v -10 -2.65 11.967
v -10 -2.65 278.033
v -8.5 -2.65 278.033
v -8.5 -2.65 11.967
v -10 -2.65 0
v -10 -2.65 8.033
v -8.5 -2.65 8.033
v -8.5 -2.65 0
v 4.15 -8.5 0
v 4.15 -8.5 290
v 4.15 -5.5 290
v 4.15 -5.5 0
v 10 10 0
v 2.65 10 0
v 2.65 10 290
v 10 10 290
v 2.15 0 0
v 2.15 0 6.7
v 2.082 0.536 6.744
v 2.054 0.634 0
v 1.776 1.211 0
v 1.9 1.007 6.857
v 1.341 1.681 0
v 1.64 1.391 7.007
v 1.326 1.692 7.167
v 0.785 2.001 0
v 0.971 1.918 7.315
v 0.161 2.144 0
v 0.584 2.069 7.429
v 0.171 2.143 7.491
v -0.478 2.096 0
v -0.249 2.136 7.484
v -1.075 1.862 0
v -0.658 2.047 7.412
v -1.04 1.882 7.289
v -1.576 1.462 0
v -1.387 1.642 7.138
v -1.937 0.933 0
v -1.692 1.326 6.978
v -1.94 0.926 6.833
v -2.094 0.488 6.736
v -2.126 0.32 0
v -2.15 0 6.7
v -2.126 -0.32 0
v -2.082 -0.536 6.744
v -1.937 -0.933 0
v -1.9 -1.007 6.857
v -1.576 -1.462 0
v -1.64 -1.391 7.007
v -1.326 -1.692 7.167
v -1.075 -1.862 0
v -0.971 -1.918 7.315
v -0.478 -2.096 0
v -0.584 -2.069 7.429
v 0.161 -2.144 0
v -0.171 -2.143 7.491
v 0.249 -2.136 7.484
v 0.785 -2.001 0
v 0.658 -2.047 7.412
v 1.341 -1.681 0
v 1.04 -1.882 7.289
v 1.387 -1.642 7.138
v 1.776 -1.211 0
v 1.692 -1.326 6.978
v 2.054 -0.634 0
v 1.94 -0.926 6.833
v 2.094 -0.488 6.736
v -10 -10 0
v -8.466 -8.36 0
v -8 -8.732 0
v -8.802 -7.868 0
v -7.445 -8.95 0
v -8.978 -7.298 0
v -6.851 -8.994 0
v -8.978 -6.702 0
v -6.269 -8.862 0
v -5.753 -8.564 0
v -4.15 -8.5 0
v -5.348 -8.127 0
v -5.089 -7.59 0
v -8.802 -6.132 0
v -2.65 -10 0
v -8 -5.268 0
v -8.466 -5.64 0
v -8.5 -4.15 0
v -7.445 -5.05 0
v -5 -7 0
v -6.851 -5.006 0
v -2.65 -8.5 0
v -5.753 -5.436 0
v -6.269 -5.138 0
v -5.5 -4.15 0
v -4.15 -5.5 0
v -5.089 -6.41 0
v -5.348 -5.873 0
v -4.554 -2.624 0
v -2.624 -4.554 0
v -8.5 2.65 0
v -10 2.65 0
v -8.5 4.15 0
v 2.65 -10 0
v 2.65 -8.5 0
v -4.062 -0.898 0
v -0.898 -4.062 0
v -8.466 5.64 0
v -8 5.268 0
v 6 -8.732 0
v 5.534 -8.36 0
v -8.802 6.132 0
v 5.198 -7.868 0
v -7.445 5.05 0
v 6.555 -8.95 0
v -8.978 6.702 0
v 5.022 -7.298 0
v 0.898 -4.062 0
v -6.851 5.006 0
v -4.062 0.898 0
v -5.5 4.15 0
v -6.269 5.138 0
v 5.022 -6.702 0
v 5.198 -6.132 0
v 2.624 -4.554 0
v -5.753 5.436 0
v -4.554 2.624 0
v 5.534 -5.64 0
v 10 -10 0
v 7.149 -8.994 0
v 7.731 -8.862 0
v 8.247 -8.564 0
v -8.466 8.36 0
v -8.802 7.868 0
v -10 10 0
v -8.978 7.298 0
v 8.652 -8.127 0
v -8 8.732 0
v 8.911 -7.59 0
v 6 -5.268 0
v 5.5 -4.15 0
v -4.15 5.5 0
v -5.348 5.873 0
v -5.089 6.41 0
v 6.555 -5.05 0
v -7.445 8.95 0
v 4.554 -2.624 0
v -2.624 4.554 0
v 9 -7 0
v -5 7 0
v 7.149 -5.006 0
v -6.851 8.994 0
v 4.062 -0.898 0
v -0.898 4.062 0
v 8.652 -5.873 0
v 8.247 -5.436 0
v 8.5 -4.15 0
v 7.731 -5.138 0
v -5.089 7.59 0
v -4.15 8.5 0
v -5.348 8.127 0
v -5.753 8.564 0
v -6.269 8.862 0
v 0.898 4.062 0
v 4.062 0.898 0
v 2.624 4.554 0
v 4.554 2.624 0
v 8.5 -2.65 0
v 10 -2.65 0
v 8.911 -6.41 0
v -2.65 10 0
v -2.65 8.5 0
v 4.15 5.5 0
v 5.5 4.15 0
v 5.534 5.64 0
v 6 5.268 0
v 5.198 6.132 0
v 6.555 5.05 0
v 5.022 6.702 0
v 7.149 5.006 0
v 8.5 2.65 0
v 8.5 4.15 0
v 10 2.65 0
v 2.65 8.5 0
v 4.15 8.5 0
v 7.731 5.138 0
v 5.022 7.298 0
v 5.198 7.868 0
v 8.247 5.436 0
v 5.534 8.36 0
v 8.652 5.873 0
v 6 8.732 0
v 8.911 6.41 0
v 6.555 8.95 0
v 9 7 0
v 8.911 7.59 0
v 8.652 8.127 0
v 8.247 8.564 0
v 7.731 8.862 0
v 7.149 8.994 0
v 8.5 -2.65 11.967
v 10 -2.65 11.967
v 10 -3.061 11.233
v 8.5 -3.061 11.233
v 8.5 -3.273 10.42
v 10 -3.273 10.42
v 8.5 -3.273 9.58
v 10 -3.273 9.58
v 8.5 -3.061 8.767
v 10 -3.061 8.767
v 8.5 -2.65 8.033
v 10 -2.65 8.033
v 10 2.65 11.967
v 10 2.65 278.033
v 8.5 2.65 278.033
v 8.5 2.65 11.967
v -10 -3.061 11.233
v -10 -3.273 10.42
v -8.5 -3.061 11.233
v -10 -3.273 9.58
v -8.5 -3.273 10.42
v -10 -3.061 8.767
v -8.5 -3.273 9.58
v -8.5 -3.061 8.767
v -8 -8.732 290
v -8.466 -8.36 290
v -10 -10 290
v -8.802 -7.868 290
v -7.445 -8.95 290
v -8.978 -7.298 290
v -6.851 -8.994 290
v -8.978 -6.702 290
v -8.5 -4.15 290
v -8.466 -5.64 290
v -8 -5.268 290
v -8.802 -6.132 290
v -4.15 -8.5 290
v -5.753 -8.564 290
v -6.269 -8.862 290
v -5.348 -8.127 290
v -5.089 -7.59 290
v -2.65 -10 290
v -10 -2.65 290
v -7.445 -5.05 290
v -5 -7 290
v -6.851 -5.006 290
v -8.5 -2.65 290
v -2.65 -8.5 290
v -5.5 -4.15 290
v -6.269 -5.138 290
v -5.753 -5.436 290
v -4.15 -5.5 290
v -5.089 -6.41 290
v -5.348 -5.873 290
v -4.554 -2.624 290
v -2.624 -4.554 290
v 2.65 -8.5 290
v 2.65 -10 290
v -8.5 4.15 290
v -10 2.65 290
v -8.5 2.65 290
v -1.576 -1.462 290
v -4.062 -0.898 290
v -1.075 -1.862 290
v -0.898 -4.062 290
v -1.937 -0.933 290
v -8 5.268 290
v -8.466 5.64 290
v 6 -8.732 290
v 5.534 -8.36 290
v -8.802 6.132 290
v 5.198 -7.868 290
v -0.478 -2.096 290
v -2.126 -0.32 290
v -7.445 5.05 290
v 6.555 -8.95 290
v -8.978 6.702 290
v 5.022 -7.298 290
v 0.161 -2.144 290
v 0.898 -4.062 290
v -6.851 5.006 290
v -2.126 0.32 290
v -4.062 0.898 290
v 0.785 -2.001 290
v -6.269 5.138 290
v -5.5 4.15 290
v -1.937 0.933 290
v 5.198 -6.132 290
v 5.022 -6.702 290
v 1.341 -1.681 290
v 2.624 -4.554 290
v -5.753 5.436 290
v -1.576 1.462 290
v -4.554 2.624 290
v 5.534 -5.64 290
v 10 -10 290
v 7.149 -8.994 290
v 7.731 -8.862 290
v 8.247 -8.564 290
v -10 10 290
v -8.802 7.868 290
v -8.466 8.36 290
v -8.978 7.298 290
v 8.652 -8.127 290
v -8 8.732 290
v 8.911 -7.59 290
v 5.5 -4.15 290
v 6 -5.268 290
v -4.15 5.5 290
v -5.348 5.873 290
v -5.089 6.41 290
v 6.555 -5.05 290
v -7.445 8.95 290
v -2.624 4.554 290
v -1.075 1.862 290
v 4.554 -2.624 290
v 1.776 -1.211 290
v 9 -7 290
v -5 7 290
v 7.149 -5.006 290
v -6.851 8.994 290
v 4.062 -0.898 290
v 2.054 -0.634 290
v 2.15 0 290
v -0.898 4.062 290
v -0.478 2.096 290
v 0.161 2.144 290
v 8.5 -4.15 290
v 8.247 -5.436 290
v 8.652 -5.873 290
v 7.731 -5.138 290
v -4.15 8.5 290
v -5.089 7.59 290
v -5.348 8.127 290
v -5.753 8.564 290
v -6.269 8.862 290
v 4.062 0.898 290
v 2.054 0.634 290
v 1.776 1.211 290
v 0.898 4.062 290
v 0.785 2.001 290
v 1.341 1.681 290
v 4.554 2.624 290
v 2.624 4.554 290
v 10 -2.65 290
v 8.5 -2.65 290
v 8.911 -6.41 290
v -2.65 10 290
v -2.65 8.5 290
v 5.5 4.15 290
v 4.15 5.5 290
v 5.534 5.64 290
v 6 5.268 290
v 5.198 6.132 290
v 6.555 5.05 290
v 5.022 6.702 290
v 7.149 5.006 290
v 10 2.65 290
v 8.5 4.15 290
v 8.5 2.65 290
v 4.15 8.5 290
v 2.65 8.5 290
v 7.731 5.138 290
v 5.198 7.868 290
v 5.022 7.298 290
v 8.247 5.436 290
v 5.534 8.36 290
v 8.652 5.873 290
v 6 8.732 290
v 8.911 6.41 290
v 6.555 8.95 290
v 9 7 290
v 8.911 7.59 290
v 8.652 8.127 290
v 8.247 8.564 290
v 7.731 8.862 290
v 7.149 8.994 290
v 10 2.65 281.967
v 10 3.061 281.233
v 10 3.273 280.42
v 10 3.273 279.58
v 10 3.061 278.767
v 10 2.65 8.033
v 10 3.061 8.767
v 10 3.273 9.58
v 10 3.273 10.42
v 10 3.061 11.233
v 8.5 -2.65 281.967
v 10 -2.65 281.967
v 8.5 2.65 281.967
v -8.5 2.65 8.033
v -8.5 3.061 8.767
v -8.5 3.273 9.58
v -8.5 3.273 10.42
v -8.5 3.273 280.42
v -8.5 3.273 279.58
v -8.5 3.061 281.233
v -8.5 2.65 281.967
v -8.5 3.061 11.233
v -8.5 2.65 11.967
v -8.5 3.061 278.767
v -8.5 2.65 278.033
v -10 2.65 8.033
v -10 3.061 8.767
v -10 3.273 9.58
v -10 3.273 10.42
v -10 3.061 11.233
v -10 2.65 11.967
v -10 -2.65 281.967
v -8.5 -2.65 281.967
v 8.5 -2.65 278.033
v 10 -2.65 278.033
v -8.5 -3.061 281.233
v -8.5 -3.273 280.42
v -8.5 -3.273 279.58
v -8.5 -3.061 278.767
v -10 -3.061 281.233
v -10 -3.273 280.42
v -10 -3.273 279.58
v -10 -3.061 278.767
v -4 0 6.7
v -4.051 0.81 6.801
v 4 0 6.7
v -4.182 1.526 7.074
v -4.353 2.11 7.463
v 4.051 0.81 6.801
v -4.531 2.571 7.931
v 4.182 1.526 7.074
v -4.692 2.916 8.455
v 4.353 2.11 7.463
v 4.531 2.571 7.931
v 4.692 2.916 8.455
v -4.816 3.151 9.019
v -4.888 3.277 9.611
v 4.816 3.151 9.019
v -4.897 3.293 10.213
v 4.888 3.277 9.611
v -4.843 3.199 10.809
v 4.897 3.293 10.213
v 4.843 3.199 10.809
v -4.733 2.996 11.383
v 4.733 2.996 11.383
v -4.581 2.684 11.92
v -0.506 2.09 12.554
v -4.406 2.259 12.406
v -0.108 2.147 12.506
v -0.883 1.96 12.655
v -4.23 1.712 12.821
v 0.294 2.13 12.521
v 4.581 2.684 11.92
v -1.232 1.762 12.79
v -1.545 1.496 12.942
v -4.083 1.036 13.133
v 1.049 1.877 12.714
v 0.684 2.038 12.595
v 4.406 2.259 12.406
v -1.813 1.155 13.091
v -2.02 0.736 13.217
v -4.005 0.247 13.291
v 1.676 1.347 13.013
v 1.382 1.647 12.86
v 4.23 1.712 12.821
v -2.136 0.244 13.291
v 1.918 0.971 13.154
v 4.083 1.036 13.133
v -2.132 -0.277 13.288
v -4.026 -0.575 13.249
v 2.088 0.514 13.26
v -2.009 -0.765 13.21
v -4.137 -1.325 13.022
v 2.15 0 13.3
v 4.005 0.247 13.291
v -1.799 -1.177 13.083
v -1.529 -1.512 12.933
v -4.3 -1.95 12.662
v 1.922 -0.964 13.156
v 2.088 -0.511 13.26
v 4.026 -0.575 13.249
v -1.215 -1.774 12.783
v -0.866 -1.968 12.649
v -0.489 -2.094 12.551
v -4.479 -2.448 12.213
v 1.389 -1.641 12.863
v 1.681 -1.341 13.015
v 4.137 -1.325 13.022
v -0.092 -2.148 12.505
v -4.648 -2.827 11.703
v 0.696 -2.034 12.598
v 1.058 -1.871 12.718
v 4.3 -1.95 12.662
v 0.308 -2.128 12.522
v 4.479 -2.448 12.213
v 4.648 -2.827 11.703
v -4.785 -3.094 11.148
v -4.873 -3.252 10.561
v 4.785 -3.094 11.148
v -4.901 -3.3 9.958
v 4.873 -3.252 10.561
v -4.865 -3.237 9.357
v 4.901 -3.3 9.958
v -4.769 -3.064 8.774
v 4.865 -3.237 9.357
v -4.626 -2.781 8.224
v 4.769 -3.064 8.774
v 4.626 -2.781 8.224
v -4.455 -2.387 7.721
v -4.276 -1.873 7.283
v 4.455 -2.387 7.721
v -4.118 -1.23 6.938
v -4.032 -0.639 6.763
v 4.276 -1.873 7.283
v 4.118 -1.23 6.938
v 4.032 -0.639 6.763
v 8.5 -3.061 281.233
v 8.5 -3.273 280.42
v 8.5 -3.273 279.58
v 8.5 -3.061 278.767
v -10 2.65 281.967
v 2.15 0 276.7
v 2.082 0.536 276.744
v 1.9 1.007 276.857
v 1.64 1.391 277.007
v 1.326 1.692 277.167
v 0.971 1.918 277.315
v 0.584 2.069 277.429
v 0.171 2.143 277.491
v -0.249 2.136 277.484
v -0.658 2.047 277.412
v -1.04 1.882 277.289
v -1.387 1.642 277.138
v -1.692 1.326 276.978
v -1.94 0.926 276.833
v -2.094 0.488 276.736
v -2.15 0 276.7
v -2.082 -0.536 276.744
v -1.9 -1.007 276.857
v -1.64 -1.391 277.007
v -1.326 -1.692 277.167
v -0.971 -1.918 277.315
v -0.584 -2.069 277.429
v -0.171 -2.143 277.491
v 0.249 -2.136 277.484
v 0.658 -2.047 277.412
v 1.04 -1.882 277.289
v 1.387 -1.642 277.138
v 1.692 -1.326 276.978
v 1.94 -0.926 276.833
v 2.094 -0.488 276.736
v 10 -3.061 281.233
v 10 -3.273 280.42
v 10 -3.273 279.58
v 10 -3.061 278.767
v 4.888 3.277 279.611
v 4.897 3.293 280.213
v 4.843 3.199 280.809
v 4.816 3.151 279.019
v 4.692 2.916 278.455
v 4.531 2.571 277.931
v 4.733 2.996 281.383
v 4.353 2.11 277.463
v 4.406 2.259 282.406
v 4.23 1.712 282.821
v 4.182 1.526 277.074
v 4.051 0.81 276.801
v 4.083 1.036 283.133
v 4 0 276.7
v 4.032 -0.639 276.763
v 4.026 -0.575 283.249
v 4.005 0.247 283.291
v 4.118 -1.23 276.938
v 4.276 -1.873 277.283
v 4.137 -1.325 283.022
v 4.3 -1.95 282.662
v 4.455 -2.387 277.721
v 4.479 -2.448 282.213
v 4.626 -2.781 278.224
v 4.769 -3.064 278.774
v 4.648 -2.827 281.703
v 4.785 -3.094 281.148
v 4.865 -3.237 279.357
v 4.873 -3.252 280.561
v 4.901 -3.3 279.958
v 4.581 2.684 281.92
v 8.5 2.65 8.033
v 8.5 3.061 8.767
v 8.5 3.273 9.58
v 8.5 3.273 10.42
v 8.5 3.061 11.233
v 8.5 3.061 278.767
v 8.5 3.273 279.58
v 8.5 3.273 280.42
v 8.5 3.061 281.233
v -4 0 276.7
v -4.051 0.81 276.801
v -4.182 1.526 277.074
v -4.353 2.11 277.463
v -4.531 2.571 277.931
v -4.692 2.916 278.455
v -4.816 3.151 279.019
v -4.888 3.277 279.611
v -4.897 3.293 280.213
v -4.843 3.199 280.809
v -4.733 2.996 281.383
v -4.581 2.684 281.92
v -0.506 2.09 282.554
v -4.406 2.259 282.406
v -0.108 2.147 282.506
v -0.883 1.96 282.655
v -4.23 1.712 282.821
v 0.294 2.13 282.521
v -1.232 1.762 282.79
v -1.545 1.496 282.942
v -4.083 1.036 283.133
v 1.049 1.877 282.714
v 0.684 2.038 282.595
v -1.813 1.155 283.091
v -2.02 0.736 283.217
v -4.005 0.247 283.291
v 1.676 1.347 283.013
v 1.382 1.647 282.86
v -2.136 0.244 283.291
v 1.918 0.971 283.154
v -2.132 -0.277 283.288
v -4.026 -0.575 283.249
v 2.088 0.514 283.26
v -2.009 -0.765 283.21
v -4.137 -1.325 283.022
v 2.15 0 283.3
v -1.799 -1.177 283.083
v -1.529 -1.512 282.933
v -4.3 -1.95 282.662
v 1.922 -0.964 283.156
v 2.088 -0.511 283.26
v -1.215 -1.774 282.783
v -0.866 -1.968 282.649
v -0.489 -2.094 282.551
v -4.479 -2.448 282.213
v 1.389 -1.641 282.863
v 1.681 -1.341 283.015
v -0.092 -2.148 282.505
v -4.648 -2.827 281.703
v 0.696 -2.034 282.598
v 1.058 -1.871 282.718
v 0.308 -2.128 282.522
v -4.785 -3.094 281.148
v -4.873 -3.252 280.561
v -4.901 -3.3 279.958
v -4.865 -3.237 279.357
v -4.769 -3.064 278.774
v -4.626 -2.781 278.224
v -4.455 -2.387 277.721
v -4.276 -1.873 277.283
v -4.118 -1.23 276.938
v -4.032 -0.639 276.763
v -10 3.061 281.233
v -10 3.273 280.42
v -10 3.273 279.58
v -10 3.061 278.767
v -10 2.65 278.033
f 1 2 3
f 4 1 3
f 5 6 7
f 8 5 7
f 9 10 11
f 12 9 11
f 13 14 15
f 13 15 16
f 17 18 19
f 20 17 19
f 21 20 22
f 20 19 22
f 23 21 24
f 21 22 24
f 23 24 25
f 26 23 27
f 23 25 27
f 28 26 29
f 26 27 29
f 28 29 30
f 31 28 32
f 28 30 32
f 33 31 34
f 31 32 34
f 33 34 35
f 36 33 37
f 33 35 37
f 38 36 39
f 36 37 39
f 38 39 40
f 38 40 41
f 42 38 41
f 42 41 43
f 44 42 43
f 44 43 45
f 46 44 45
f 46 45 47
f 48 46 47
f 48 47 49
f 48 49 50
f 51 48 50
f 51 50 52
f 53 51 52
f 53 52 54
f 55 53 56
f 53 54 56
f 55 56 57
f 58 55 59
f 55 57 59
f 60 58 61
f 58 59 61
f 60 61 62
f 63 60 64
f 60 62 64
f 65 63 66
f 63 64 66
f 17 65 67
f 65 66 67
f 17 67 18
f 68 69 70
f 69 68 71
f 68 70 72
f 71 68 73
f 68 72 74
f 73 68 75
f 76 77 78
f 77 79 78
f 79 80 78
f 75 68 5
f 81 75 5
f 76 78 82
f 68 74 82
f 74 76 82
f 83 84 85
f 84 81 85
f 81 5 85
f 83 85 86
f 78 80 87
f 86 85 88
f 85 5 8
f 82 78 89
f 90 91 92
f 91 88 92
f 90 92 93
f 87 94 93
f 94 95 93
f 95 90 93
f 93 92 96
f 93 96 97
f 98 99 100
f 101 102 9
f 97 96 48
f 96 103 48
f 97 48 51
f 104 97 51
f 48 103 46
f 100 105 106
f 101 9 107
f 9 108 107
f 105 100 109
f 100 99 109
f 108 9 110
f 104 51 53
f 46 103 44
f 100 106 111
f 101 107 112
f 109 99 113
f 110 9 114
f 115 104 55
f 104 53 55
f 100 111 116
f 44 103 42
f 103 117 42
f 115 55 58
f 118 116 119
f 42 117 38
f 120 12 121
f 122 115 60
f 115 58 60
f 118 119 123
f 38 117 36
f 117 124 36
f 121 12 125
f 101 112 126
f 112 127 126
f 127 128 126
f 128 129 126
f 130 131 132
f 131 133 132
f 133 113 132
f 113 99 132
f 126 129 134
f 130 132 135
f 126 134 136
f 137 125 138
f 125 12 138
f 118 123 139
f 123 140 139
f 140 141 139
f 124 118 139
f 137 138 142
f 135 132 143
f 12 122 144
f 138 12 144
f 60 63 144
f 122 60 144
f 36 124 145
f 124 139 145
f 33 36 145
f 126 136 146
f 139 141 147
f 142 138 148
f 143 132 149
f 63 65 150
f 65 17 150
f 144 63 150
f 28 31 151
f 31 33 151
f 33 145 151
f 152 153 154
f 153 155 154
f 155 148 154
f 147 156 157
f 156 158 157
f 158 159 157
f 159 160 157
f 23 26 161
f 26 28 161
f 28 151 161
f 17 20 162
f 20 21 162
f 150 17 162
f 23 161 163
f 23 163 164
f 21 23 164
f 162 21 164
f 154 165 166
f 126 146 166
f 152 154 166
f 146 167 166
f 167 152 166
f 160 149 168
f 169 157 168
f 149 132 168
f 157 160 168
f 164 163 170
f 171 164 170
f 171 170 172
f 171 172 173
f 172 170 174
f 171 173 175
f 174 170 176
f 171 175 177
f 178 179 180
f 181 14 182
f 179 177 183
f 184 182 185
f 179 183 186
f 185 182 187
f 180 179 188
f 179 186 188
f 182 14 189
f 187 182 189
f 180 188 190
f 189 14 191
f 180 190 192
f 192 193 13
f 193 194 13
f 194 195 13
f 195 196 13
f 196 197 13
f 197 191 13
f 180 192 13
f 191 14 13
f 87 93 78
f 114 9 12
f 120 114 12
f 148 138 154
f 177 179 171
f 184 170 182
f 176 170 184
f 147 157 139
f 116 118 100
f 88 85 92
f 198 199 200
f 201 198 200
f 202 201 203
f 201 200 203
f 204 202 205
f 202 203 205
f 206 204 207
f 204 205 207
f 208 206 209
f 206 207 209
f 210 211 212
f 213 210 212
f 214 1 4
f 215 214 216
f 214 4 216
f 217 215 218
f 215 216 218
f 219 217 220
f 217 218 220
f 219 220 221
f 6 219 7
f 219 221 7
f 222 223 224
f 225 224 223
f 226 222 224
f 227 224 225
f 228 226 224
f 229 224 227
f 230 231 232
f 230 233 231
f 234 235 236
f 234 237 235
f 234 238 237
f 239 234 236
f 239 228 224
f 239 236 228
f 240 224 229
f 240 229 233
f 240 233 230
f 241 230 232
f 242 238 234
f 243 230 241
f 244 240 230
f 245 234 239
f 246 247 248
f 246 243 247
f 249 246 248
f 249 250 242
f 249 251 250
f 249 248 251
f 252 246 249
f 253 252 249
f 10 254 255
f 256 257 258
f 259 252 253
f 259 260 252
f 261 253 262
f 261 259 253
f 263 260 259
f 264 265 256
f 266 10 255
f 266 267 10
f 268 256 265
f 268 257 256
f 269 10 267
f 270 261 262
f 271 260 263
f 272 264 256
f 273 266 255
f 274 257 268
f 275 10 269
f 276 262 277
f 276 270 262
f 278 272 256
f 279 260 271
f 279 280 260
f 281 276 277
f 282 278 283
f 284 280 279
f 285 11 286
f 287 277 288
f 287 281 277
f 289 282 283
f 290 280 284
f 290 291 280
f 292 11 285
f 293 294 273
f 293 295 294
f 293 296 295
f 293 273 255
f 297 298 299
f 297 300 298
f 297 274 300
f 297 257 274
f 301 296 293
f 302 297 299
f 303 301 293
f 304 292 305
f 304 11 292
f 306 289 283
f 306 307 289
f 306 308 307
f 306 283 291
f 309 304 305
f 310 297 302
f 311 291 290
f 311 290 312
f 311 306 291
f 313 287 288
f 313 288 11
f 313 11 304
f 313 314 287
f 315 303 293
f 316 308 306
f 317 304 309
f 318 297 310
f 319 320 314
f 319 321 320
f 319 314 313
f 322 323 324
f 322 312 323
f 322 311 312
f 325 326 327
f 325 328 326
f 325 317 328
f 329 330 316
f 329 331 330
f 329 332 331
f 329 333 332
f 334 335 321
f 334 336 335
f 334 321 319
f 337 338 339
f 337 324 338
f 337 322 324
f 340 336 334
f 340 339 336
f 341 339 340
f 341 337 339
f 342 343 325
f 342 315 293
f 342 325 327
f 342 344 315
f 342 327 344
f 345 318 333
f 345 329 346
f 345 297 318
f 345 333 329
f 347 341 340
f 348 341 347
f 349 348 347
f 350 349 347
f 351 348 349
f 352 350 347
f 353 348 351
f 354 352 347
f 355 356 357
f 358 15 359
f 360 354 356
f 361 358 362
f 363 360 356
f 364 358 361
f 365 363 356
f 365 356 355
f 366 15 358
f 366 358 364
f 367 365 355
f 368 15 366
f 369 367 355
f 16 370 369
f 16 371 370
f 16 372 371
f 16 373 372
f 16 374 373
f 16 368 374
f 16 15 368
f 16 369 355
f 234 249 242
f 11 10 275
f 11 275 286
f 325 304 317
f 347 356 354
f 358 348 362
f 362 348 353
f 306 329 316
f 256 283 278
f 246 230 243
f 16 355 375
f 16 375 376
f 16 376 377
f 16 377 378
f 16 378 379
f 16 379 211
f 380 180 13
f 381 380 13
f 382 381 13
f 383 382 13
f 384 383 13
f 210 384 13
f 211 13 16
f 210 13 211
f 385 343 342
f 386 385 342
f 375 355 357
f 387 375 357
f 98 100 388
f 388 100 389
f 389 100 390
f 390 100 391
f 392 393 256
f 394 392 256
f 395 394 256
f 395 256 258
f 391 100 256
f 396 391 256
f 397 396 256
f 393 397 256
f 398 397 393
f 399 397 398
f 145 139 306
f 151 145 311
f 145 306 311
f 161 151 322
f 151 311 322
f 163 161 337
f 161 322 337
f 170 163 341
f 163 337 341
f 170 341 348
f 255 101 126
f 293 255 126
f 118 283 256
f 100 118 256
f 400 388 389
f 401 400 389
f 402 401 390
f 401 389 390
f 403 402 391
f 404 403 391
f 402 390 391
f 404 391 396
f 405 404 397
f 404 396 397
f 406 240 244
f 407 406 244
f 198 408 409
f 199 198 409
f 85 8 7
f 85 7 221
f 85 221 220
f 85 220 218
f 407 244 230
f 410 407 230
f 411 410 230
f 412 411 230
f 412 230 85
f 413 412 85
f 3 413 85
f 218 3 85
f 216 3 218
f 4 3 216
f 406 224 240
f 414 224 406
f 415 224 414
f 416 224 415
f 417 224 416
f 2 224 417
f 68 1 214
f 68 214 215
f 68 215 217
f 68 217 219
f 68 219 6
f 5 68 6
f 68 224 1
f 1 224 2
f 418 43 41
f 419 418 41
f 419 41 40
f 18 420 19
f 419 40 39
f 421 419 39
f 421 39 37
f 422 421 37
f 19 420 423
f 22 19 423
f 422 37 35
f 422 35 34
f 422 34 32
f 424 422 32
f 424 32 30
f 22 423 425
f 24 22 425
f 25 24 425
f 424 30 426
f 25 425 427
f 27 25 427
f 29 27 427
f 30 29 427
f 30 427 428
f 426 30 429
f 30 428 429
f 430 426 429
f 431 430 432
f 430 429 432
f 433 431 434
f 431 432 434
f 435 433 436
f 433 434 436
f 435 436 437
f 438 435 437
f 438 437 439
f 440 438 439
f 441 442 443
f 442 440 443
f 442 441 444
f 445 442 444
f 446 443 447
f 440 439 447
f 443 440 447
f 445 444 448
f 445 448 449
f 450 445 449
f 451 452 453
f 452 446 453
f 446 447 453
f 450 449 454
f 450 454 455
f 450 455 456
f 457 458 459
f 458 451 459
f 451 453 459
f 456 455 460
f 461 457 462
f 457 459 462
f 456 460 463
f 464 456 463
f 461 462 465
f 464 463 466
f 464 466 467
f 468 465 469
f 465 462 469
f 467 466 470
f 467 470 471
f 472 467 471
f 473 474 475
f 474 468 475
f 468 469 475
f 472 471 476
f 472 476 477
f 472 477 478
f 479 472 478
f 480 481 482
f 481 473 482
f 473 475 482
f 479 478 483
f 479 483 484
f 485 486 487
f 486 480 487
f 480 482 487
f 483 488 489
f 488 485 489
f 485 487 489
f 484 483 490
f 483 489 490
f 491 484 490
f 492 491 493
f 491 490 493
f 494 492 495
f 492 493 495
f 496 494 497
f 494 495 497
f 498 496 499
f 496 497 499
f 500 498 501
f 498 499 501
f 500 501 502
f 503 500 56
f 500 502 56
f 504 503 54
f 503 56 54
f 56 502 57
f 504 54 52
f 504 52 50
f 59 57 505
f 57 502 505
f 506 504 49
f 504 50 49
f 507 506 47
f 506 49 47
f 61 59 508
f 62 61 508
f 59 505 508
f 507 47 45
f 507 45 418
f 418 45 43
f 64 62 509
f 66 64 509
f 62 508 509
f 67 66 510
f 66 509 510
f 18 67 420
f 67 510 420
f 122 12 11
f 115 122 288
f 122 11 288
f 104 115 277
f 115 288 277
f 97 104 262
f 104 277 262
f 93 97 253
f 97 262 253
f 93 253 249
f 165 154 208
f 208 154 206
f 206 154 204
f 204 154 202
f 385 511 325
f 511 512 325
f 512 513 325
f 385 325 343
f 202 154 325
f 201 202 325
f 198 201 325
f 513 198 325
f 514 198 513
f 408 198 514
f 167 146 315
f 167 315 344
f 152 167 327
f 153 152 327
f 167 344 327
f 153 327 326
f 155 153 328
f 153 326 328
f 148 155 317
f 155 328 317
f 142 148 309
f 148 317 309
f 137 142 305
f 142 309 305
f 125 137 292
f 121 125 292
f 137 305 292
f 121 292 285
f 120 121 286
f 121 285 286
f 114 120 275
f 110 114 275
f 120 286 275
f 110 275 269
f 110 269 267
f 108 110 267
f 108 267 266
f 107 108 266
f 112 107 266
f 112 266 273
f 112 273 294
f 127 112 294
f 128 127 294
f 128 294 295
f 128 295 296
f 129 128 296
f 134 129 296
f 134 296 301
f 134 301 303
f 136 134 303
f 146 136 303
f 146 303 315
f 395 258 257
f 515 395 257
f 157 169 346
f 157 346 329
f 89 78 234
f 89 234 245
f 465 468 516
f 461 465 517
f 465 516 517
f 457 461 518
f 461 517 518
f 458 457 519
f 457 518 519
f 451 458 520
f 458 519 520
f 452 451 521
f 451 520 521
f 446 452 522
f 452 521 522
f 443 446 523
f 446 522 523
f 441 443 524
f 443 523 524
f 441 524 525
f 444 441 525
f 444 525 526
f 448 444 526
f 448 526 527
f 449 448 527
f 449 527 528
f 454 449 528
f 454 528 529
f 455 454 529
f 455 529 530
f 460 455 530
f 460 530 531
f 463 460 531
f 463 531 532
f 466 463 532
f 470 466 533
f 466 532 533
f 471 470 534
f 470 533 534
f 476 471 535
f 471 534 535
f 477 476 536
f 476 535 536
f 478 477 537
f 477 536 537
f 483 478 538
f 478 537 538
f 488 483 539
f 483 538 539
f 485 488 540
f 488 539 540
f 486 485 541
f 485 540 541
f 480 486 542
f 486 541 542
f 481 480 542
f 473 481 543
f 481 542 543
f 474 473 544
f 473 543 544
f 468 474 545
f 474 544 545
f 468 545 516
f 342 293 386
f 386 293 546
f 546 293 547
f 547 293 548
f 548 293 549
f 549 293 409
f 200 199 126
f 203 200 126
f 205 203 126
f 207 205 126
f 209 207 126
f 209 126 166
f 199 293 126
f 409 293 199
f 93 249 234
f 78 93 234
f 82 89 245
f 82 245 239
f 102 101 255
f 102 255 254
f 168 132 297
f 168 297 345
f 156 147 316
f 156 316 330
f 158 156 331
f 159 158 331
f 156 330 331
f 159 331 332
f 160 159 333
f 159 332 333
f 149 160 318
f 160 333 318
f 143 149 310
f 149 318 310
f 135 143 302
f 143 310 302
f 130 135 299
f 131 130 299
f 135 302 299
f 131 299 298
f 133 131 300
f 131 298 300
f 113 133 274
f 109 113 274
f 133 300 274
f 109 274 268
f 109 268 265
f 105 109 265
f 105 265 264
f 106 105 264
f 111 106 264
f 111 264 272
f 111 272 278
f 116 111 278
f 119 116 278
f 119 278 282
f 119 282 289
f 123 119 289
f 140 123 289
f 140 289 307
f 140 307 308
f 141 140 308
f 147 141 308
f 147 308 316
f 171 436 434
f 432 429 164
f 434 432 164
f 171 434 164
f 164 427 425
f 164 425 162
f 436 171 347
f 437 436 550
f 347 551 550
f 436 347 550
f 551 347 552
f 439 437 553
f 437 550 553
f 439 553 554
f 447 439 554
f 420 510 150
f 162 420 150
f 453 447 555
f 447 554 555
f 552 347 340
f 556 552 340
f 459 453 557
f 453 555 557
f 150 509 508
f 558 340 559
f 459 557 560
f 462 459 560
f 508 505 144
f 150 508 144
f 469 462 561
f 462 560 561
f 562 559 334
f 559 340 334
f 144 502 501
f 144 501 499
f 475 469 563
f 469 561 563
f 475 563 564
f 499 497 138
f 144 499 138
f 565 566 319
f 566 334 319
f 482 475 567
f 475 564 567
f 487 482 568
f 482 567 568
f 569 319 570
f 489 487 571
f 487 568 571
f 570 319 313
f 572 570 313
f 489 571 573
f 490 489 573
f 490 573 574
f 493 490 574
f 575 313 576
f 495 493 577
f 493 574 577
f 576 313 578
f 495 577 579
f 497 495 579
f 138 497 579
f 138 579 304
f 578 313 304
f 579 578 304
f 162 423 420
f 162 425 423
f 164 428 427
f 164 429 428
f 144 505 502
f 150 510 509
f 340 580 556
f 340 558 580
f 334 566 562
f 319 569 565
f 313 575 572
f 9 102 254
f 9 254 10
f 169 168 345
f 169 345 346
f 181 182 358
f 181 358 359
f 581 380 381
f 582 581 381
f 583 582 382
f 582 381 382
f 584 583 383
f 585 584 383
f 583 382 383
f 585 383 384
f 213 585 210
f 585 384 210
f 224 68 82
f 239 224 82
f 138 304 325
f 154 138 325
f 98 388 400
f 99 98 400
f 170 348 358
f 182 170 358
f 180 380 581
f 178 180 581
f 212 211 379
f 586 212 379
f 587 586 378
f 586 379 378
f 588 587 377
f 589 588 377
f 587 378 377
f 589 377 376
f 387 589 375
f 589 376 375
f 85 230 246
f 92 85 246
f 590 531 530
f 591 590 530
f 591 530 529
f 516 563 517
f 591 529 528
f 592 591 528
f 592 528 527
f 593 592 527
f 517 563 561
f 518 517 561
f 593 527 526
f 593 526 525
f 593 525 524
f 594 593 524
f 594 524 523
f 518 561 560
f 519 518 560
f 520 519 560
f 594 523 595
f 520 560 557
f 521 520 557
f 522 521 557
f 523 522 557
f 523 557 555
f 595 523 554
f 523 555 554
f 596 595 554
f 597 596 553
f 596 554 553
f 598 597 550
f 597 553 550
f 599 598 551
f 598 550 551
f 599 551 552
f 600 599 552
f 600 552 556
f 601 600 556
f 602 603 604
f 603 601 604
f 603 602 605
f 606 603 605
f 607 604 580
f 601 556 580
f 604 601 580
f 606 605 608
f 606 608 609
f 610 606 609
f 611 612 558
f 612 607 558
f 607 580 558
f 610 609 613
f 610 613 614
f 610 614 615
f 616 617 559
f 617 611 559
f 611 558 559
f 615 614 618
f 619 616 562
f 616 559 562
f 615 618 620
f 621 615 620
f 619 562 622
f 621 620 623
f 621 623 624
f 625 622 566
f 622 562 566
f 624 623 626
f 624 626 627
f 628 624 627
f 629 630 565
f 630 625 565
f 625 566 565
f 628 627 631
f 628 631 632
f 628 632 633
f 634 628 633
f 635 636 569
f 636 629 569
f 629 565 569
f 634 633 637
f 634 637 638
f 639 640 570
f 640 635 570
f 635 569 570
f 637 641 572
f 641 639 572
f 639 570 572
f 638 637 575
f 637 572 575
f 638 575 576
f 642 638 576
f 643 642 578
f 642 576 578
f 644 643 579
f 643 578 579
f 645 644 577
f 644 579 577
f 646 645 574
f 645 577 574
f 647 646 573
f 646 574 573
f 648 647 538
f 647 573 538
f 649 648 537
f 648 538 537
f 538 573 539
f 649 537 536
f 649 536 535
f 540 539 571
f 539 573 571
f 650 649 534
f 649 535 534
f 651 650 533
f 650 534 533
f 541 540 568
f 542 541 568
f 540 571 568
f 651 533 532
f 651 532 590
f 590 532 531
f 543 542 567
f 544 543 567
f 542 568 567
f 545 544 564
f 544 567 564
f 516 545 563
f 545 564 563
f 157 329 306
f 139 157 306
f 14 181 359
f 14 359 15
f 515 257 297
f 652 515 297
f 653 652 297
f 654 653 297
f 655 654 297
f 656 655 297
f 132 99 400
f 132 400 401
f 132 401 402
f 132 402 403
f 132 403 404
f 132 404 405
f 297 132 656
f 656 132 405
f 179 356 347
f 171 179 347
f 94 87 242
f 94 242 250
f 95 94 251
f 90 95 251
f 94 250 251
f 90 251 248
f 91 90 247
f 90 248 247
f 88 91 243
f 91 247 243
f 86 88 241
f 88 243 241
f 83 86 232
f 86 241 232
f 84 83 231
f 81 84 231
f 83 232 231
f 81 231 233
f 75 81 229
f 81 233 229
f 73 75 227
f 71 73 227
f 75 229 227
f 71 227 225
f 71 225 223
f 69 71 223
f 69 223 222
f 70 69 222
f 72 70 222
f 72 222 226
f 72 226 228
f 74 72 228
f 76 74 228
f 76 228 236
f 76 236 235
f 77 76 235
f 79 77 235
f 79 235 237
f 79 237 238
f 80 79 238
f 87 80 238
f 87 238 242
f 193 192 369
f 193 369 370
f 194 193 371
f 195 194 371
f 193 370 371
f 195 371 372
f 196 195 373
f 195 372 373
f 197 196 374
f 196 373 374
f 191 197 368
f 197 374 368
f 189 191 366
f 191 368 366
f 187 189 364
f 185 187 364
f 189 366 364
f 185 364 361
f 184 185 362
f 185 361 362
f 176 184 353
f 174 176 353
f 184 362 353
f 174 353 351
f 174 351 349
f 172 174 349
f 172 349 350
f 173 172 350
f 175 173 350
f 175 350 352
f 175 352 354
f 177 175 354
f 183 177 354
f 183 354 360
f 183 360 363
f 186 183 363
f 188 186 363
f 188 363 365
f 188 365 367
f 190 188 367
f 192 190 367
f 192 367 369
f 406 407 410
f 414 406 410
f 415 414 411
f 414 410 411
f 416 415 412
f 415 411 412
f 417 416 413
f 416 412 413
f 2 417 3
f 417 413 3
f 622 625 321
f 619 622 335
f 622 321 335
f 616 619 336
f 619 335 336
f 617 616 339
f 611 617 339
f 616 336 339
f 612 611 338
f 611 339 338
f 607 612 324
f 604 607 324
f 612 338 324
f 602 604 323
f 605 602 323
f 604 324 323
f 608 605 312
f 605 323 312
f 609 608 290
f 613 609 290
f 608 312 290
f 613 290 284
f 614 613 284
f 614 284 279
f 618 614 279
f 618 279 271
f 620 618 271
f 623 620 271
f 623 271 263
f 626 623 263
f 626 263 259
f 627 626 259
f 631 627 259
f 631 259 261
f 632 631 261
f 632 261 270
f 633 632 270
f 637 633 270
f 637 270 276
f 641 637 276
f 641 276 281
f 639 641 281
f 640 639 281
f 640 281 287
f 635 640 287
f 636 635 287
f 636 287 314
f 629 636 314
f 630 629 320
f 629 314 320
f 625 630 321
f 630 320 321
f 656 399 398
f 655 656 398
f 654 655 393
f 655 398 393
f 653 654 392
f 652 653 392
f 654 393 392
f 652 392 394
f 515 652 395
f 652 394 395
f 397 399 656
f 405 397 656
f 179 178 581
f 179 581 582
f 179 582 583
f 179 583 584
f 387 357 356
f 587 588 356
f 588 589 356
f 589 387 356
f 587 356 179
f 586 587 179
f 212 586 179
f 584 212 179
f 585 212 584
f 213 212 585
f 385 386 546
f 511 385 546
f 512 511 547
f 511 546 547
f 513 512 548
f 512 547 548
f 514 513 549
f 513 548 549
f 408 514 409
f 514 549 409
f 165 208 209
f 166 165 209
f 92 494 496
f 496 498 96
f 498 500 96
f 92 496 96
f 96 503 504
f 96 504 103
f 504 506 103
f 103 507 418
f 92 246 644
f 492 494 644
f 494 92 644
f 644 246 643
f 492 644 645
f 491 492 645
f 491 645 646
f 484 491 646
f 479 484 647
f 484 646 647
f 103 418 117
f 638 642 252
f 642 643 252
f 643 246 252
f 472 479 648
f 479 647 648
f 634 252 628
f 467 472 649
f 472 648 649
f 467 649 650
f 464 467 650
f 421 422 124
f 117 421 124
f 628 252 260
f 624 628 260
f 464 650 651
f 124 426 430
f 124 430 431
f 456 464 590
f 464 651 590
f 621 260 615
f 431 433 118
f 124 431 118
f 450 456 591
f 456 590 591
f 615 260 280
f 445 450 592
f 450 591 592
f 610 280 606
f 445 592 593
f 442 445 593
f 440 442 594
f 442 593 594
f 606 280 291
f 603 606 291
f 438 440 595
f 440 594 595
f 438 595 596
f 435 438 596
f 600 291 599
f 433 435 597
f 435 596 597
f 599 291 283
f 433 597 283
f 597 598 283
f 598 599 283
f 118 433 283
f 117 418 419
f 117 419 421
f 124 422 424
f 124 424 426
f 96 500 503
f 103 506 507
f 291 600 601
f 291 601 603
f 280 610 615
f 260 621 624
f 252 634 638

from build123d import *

# Parameters (mm, degrees)
SKETCH_1_W          = 20
SKETCH_1_H          = 20
EXTRUDE_1_DEPTH     = 290
SKETCH_2_R          = 2.15
SKETCH_2_R_2        = 2
CUT_EXTRUDE_1_DEPTH = 291.344622819
HOLE_WIZARD_M6_1_D  = 6.6


with BuildPart() as part:
    # 스케치1 → 보스-돌출1 (new body)
    with BuildSketch(Plane.XY):
        Rectangle(SKETCH_1_W, SKETCH_1_H)
    extrude(amount=EXTRUDE_1_DEPTH)

    # 스케치2 → 컷-돌출1 (cut, through all)
    with BuildSketch(Plane.XY.offset(290)):
        Circle(SKETCH_2_R)
        with Locations((-7, 7)):
            Circle(SKETCH_2_R_2)
        with Locations((7, 7)):
            Circle(SKETCH_2_R_2)
        with Locations((7, -7)):
            Circle(SKETCH_2_R_2)
        with Locations((-7, -7)):
            Circle(SKETCH_2_R_2)
        with BuildLine():
            Line((-2.65, 10), (-2.65, 8.5))
            Line((-2.65, 8.5), (-4.15, 8.5))
            Line((-4.15, 8.5), (-4.15, 5.5))
            ThreePointArc((-4.15, 5.5), (0, 4), (4.15, 5.5))
            Line((4.15, 5.5), (4.15, 8.5))
            Line((4.15, 8.5), (2.65, 8.5))
            Line((2.65, 8.5), (2.65, 10))
            Line((2.65, 10), (-2.65, 10))
        make_face()
        with BuildLine():
            Line((10, 2.65), (8.5, 2.65))
            Line((8.5, 2.65), (8.5, 4.15))
            Line((8.5, 4.15), (5.5, 4.15))
            ThreePointArc((5.5, 4.15), (4, 0), (5.5, -4.15))
            Line((5.5, -4.15), (8.5, -4.15))
            Line((8.5, -4.15), (8.5, -2.65))
            Line((8.5, -2.65), (10, -2.65))
            Line((10, -2.65), (10, 2.65))
        make_face()
        with BuildLine():
            Line((2.65, -10), (2.65, -8.5))
            Line((2.65, -8.5), (4.15, -8.5))
            Line((4.15, -8.5), (4.15, -5.5))
            ThreePointArc((4.15, -5.5), (0, -4), (-4.15, -5.5))
            Line((-4.15, -5.5), (-4.15, -8.5))
            Line((-4.15, -8.5), (-2.65, -8.5))
            Line((-2.65, -8.5), (-2.65, -10))
            Line((-2.65, -10), (2.65, -10))
        make_face()
        with BuildLine():
            Line((-10, -2.65), (-8.5, -2.65))
            Line((-8.5, -2.65), (-8.5, -4.15))
            Line((-8.5, -4.15), (-5.5, -4.15))
            ThreePointArc((-5.5, -4.15), (-4, 0), (-5.5, 4.15))
            Line((-5.5, 4.15), (-8.5, 4.15))
            Line((-8.5, 4.15), (-8.5, 2.65))
            Line((-8.5, 2.65), (-10, 2.65))
            Line((-10, 2.65), (-10, -2.65))
        make_face()
    extrude(amount=-CUT_EXTRUDE_1_DEPTH, mode=Mode.SUBTRACT)

    # M6 여유 구멍1 (through all)
    with Locations(Plane.ZY.offset(10)):
        with Locations((10, 0), (280, 0)):
            Hole(HOLE_WIZARD_M6_1_D / 2)


solid = part.part
